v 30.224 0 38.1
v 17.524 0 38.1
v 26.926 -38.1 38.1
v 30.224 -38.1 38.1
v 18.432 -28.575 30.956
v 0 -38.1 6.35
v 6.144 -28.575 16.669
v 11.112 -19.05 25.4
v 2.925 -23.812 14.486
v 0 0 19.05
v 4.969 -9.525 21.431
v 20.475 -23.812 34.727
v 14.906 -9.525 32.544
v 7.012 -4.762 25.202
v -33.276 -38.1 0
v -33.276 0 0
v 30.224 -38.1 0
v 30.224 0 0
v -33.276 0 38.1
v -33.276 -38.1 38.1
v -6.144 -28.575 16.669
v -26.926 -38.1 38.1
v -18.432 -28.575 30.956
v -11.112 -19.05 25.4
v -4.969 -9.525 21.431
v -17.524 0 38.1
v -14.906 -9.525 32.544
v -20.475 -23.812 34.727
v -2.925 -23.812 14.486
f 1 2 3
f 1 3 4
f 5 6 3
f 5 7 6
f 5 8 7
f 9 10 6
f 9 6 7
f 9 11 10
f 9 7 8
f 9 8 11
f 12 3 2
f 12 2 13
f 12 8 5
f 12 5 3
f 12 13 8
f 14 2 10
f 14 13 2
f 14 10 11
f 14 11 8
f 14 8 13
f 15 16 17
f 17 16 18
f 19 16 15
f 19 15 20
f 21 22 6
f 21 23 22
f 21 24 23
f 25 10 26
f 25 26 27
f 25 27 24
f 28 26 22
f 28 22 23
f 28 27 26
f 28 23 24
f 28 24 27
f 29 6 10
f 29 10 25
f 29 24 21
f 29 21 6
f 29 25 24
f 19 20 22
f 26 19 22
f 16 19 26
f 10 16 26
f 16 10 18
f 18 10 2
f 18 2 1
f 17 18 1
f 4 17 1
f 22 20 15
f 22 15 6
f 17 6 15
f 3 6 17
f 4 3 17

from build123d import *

# Parameters (mm, degrees)
F0_W     = 63.5
F0_H     = 38.1
F1_DEPTH = 38.1


with BuildPart() as f1:
    # F0 (on Front) → F1 (new body)
    with BuildSketch(Plane.XZ):
        with Locations((-1.526443, 19.05)):
            Rectangle(F0_W, F0_H)
    extrude(amount=F1_DEPTH)

    # F2 (on face) → F4 section 0
    with BuildSketch(Plane.XZ.offset(38.1)):
        Polygon((26.926443, 38.1), (-26.926443, 38.1), (0, 6.35), align=None)
    # F3 (on face) → F4 section 1
    with BuildSketch(Plane(origin=(0, 0, 0), x_dir=(-1, 0, 0), z_dir=(0, 1, 0))):
        Polygon((17.523557, 38.1), (-17.523557, 38.1), (0, 19.05), align=None)
    loft(mode=Mode.SUBTRACT)


solid = f1.part
